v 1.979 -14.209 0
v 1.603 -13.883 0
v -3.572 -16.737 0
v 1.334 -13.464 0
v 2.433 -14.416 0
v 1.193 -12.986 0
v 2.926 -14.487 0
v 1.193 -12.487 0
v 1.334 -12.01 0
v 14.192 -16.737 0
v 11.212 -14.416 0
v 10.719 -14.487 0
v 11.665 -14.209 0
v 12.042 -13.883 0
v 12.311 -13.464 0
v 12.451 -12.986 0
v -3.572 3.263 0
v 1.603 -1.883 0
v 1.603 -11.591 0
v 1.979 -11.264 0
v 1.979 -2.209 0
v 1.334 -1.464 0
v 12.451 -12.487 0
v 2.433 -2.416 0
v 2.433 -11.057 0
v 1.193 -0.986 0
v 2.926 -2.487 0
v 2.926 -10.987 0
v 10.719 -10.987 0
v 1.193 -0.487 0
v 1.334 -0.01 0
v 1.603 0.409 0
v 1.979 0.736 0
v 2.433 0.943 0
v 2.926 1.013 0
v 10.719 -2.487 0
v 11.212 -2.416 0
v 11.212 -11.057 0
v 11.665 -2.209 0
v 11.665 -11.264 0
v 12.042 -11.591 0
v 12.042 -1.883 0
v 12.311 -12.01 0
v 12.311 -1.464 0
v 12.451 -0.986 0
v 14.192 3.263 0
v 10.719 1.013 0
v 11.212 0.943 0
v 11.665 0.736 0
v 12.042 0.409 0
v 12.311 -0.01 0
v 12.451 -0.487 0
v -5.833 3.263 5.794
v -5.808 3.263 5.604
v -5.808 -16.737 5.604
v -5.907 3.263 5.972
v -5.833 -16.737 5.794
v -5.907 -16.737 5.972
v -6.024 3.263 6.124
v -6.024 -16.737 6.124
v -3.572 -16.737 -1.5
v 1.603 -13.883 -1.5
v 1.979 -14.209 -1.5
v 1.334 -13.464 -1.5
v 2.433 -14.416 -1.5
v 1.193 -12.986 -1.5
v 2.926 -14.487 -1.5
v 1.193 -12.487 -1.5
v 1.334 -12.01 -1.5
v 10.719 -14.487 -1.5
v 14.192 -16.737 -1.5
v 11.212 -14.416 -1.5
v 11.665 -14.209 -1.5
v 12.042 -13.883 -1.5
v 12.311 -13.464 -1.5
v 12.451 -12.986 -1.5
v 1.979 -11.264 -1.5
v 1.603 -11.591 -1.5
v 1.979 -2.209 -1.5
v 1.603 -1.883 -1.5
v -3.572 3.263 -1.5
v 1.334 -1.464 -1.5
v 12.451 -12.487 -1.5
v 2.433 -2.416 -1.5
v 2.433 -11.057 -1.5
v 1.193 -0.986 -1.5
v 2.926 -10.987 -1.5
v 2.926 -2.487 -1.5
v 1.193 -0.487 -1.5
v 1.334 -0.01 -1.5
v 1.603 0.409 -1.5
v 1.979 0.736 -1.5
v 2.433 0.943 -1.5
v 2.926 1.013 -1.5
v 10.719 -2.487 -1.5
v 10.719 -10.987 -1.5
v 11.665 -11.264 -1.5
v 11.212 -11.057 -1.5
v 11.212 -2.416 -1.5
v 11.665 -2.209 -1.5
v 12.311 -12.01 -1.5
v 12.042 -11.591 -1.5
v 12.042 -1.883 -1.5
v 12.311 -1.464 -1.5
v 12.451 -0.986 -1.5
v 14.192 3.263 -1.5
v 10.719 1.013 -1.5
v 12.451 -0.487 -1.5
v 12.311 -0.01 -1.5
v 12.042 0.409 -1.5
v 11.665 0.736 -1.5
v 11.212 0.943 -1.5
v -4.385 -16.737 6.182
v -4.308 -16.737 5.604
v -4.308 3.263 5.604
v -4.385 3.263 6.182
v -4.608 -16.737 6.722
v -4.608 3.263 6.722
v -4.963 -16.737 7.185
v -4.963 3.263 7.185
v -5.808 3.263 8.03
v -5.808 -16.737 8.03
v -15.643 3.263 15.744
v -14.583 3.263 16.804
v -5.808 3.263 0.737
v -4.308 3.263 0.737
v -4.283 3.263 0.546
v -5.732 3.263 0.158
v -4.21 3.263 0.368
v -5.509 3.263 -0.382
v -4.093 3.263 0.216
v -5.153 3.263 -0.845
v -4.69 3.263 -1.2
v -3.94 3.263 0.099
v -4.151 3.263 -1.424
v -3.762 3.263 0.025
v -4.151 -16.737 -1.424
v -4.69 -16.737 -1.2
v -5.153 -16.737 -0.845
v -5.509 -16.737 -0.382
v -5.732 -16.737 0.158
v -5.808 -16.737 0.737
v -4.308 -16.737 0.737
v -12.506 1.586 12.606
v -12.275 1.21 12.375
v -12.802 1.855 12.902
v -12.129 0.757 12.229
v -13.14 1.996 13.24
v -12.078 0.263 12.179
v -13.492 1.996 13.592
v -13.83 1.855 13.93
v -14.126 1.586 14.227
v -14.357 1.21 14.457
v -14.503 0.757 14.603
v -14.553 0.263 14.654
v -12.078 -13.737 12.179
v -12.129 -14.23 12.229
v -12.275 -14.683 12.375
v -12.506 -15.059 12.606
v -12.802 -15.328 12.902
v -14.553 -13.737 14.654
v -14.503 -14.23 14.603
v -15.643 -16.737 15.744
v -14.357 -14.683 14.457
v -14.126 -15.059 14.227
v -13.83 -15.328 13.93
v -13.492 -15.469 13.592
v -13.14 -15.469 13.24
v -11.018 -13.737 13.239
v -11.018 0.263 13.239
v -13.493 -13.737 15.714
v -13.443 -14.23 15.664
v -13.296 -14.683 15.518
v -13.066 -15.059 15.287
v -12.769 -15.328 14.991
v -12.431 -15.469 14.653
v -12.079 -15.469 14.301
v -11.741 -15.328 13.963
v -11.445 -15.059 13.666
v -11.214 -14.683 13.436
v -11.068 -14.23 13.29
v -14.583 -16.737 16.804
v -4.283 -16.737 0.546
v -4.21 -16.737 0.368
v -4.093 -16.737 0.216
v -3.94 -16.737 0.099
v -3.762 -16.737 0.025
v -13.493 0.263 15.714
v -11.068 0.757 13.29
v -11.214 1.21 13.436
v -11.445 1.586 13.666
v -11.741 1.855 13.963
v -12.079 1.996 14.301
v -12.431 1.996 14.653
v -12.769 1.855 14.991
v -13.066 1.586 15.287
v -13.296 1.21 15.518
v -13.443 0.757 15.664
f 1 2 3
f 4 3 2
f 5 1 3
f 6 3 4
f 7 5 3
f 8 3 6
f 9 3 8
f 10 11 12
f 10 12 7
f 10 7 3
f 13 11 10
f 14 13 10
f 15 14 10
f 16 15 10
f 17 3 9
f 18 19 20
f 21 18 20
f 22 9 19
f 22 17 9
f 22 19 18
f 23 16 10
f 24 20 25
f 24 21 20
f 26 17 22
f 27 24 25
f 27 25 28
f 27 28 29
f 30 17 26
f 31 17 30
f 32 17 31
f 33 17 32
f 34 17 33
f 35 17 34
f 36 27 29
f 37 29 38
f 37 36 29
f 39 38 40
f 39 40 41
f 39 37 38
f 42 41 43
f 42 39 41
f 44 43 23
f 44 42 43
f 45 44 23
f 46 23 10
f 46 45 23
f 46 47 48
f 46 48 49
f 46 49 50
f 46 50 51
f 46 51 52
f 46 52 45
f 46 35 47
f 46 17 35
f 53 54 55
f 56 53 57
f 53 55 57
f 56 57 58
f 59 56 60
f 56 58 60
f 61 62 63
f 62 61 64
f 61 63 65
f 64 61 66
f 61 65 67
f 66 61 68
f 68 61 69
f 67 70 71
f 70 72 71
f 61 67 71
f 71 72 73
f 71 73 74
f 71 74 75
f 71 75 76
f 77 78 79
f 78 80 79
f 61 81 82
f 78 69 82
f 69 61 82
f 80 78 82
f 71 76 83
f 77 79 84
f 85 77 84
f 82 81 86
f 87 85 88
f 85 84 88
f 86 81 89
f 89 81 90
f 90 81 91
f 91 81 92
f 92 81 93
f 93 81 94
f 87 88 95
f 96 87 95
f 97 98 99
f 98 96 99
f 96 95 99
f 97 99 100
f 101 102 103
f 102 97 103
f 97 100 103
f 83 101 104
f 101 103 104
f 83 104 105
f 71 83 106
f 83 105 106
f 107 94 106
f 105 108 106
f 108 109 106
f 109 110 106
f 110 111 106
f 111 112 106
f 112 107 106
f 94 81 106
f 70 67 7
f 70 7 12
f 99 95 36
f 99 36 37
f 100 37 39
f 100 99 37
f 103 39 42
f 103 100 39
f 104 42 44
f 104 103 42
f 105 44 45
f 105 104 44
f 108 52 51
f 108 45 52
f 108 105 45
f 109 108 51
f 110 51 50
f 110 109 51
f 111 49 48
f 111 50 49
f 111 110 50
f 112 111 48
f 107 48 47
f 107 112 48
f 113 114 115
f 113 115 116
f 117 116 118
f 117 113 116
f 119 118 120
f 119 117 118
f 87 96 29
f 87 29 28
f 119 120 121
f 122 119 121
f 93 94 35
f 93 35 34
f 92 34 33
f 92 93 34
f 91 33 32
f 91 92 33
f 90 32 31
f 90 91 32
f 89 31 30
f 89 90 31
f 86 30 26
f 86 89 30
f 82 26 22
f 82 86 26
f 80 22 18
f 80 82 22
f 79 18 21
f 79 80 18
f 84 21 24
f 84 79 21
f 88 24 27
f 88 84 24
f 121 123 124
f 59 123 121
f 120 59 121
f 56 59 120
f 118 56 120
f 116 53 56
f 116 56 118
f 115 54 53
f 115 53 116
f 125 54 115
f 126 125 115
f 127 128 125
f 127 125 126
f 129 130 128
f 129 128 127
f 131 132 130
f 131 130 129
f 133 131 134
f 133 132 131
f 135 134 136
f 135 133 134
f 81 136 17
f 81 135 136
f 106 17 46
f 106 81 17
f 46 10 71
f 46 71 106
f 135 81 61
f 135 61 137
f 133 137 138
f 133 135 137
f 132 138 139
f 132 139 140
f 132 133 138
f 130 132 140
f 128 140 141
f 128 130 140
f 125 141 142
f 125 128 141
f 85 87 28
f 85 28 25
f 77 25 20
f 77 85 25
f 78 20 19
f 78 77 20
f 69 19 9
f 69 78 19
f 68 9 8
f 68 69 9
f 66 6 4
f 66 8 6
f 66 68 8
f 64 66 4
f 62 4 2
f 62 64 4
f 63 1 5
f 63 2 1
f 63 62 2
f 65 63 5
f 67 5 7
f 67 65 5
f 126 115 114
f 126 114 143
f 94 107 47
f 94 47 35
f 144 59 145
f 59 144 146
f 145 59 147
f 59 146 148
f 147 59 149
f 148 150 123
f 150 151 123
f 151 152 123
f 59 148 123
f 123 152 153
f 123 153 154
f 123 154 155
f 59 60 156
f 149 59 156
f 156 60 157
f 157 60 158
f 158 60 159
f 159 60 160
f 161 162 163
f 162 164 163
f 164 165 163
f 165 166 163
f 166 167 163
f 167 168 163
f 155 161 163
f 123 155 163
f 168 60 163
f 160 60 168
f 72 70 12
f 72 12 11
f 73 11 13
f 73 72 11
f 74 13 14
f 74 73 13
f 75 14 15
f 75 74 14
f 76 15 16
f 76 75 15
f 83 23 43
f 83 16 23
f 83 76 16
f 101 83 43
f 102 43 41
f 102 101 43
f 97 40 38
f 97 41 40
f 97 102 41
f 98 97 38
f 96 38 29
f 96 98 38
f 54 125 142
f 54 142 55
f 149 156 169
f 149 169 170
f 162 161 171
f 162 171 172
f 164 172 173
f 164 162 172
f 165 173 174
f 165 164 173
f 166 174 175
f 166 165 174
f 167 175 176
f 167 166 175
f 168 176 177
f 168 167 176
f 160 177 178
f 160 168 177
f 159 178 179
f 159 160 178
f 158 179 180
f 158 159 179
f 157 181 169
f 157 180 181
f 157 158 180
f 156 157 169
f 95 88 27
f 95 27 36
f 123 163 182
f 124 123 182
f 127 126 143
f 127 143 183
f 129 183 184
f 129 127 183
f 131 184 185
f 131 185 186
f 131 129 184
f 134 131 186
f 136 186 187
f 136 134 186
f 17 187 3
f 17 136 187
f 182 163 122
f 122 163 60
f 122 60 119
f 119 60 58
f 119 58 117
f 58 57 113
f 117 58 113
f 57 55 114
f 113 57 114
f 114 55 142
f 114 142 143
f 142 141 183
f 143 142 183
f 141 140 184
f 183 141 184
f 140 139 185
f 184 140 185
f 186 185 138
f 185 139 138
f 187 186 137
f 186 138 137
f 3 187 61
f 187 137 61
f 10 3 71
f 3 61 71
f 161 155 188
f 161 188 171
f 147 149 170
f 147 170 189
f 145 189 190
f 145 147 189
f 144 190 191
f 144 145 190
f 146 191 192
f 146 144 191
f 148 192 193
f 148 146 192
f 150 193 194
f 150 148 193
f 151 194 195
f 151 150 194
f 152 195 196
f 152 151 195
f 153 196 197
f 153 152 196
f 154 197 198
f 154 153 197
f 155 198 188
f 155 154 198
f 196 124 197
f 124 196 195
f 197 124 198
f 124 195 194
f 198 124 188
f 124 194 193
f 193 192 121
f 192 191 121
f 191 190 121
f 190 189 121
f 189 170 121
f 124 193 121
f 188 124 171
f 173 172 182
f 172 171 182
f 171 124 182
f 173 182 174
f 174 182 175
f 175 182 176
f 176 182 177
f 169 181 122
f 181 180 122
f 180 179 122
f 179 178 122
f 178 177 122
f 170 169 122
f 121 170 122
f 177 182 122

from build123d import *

# Parameters (mm, degrees)
SKETCH1_W                    = 20
SKETCH1_H                    = 20
BASE_FLANGE1_DEPTH           = 1.5
EDGE_FLANGE1_STRIP_W         = 7.4732
EDGE_FLANGE1_STRIP_H         = 1.5
EDGE_FLANGE1_STRIP_CUT_DEPTH = 20
EDGE_FLANGE1_DEPTH           = 20
EDGE_FLANGE2_START           = -16.736526946
EDGE_FLANGE2_DEPTH           = 20
EDGE_FLANGE2_2_DEPTH         = 20
CUT_EXTRUDE1_DEPTH           = 30.323545381
CUT_EXTRUDE2_DEPTH           = 10


# Read off the part's stored shape, not the designer's step: Edge-Flange2
# Sheet-metal steps are written as plain solids
with BuildPart() as part:
    # Sketch1 → Base-Flange1 (new body)
    with BuildSketch(Plane.XY):
        with Locations((4.191616766, -6.736526946)):
            Rectangle(SKETCH1_W, SKETCH1_H)
    extrude(amount=-BASE_FLANGE1_DEPTH)

    # Edge-Flange1 strip (across the edge) → Edge-Flange1 strip cut (cut)
    with BuildSketch(Plane(origin=(-5.808383234, 3.263473054, 0), x_dir=(1, 0, 0), z_dir=(0, -1, 0))):
        with Locations((-1.5, -0.75)):
            Rectangle(EDGE_FLANGE1_STRIP_W, EDGE_FLANGE1_STRIP_H)
    extrude(amount=EDGE_FLANGE1_STRIP_CUT_DEPTH, mode=Mode.SUBTRACT)

    # Edge-Flange1 section (across the edge) → Edge-Flange1 (add)
    with BuildSketch(Plane(origin=(-5.808383234, 3.263473054, 0), x_dir=(1, 0, 0), z_dir=(0, -1, 0))):
        with BuildLine():
            Line((0, 0.7366), (0, 8.03))
            Line((0, 8.03), (1.5, 8.03))
            Line((1.5, 8.03), (1.5, 0.7366))
            ThreePointArc((1.5, 0.7366), (1.715745145, 0.215745145), (2.2366, 0))
            Line((2.2366, 0), (2.2366, -1.5))
            ThreePointArc((2.2366, -1.5), (0.655084973, -0.844915027), (0, 0.7366))
        make_face()
    extrude(amount=EDGE_FLANGE1_DEPTH)

    # Edge-Flange2 outline → Edge-Flange2 (cut)
    with BuildSketch(Plane(origin=(0, 0, 0), x_dir=(1, 0, 0), z_dir=(0, 1, 0)).offset(EDGE_FLANGE2_START)):
        with BuildLine():
            ThreePointArc((-4.308383234, -5.603569946), (-4.478634271, -6.459479711), (-4.963468207, -7.185084973))
            Line((-4.963468207, -7.185084973), (-5.808383234, -8.03))
            Line((-5.808383234, -8.03), (-4.308383234, -8.03))
            Line((-4.308383234, -8.03), (-4.308383234, -5.603569946))
        make_face()
    extrude(amount=EDGE_FLANGE2_DEPTH, mode=Mode.SUBTRACT)

    # Edge-Flange2 2 outline → Edge-Flange2 2 (add)
    with BuildSketch(Plane(origin=(0, 0, 0), x_dir=(1, 0, 0), z_dir=(0, 1, 0)).offset(EDGE_FLANGE2_START)):
        with BuildLine():
            Line((-14.582644764, -16.804261531), (-5.808383234, -8.03))
            Line((-5.808383234, -8.03), (-5.808383234, -5.603569946))
            ThreePointArc((-5.808383234, -5.603569946), (-5.86445357, -5.885454563), (-6.024128379, -6.124424801))
            Line((-6.024128379, -6.124424801), (-15.643304936, -15.743601359))
            Line((-15.643304936, -15.743601359), (-14.582644764, -16.804261531))
        make_face()
    extrude(amount=EDGE_FLANGE2_2_DEPTH)

    # Sketch12 → Cut-Extrude1 (cut, through all)
    with BuildSketch(Plane(origin=(0, 0, -1.5), x_dir=(-1, 0, 0), z_dir=(0, 0, -1))):
        with BuildLine():
            Line((-2.925555282, -14.486526946), (-10.71929847, -14.486526946))
            ThreePointArc((-10.71929847, -14.486526946), (-12.46929847, -12.736526946), (-10.71929847, -10.986526946))
            Line((-10.71929847, -10.986526946), (-2.925555282, -10.986526946))
            ThreePointArc((-2.925555282, -10.986526946), (-1.175555282, -12.736526946), (-2.925555282, -14.486526946))
        make_face()
        with BuildLine():
            Line((-2.925555282, -2.486526946), (-10.71929847, -2.486526946))
            ThreePointArc((-10.71929847, -2.486526946), (-12.46929847, -0.736526946), (-10.71929847, 1.013473054))
            Line((-10.71929847, 1.013473054), (-2.925555282, 1.013473054))
            ThreePointArc((-2.925555282, 1.013473054), (-1.175555282, -0.736526946), (-2.925555282, -2.486526946))
        make_face()
    extrude(amount=-CUT_EXTRUDE1_DEPTH, mode=Mode.SUBTRACT)

    # Sketch13 → Cut-Extrude2 (cut)
    with BuildSketch(Plane(origin=(0.050148211, 0, 0.050148211), x_dir=(-0.7071067811865465, 0, 0.7071067811865487), z_dir=(-0.7071067811865487, 0, -0.7071067811865465))):
        with BuildLine():
            Line((17.152424018, -13.736526946), (17.152424018, 0.263473054))
            ThreePointArc((17.152424018, 0.263473054), (18.902424018, 2.013473054), (20.652424018, 0.263473054))
            Line((20.652424018, 0.263473054), (20.652424018, -13.736526946))
            ThreePointArc((20.652424018, -13.736526946), (18.902424018, -15.486526946), (17.152424018, -13.736526946))
        make_face()
    extrude(amount=-CUT_EXTRUDE2_DEPTH, mode=Mode.SUBTRACT)


solid = part.part
